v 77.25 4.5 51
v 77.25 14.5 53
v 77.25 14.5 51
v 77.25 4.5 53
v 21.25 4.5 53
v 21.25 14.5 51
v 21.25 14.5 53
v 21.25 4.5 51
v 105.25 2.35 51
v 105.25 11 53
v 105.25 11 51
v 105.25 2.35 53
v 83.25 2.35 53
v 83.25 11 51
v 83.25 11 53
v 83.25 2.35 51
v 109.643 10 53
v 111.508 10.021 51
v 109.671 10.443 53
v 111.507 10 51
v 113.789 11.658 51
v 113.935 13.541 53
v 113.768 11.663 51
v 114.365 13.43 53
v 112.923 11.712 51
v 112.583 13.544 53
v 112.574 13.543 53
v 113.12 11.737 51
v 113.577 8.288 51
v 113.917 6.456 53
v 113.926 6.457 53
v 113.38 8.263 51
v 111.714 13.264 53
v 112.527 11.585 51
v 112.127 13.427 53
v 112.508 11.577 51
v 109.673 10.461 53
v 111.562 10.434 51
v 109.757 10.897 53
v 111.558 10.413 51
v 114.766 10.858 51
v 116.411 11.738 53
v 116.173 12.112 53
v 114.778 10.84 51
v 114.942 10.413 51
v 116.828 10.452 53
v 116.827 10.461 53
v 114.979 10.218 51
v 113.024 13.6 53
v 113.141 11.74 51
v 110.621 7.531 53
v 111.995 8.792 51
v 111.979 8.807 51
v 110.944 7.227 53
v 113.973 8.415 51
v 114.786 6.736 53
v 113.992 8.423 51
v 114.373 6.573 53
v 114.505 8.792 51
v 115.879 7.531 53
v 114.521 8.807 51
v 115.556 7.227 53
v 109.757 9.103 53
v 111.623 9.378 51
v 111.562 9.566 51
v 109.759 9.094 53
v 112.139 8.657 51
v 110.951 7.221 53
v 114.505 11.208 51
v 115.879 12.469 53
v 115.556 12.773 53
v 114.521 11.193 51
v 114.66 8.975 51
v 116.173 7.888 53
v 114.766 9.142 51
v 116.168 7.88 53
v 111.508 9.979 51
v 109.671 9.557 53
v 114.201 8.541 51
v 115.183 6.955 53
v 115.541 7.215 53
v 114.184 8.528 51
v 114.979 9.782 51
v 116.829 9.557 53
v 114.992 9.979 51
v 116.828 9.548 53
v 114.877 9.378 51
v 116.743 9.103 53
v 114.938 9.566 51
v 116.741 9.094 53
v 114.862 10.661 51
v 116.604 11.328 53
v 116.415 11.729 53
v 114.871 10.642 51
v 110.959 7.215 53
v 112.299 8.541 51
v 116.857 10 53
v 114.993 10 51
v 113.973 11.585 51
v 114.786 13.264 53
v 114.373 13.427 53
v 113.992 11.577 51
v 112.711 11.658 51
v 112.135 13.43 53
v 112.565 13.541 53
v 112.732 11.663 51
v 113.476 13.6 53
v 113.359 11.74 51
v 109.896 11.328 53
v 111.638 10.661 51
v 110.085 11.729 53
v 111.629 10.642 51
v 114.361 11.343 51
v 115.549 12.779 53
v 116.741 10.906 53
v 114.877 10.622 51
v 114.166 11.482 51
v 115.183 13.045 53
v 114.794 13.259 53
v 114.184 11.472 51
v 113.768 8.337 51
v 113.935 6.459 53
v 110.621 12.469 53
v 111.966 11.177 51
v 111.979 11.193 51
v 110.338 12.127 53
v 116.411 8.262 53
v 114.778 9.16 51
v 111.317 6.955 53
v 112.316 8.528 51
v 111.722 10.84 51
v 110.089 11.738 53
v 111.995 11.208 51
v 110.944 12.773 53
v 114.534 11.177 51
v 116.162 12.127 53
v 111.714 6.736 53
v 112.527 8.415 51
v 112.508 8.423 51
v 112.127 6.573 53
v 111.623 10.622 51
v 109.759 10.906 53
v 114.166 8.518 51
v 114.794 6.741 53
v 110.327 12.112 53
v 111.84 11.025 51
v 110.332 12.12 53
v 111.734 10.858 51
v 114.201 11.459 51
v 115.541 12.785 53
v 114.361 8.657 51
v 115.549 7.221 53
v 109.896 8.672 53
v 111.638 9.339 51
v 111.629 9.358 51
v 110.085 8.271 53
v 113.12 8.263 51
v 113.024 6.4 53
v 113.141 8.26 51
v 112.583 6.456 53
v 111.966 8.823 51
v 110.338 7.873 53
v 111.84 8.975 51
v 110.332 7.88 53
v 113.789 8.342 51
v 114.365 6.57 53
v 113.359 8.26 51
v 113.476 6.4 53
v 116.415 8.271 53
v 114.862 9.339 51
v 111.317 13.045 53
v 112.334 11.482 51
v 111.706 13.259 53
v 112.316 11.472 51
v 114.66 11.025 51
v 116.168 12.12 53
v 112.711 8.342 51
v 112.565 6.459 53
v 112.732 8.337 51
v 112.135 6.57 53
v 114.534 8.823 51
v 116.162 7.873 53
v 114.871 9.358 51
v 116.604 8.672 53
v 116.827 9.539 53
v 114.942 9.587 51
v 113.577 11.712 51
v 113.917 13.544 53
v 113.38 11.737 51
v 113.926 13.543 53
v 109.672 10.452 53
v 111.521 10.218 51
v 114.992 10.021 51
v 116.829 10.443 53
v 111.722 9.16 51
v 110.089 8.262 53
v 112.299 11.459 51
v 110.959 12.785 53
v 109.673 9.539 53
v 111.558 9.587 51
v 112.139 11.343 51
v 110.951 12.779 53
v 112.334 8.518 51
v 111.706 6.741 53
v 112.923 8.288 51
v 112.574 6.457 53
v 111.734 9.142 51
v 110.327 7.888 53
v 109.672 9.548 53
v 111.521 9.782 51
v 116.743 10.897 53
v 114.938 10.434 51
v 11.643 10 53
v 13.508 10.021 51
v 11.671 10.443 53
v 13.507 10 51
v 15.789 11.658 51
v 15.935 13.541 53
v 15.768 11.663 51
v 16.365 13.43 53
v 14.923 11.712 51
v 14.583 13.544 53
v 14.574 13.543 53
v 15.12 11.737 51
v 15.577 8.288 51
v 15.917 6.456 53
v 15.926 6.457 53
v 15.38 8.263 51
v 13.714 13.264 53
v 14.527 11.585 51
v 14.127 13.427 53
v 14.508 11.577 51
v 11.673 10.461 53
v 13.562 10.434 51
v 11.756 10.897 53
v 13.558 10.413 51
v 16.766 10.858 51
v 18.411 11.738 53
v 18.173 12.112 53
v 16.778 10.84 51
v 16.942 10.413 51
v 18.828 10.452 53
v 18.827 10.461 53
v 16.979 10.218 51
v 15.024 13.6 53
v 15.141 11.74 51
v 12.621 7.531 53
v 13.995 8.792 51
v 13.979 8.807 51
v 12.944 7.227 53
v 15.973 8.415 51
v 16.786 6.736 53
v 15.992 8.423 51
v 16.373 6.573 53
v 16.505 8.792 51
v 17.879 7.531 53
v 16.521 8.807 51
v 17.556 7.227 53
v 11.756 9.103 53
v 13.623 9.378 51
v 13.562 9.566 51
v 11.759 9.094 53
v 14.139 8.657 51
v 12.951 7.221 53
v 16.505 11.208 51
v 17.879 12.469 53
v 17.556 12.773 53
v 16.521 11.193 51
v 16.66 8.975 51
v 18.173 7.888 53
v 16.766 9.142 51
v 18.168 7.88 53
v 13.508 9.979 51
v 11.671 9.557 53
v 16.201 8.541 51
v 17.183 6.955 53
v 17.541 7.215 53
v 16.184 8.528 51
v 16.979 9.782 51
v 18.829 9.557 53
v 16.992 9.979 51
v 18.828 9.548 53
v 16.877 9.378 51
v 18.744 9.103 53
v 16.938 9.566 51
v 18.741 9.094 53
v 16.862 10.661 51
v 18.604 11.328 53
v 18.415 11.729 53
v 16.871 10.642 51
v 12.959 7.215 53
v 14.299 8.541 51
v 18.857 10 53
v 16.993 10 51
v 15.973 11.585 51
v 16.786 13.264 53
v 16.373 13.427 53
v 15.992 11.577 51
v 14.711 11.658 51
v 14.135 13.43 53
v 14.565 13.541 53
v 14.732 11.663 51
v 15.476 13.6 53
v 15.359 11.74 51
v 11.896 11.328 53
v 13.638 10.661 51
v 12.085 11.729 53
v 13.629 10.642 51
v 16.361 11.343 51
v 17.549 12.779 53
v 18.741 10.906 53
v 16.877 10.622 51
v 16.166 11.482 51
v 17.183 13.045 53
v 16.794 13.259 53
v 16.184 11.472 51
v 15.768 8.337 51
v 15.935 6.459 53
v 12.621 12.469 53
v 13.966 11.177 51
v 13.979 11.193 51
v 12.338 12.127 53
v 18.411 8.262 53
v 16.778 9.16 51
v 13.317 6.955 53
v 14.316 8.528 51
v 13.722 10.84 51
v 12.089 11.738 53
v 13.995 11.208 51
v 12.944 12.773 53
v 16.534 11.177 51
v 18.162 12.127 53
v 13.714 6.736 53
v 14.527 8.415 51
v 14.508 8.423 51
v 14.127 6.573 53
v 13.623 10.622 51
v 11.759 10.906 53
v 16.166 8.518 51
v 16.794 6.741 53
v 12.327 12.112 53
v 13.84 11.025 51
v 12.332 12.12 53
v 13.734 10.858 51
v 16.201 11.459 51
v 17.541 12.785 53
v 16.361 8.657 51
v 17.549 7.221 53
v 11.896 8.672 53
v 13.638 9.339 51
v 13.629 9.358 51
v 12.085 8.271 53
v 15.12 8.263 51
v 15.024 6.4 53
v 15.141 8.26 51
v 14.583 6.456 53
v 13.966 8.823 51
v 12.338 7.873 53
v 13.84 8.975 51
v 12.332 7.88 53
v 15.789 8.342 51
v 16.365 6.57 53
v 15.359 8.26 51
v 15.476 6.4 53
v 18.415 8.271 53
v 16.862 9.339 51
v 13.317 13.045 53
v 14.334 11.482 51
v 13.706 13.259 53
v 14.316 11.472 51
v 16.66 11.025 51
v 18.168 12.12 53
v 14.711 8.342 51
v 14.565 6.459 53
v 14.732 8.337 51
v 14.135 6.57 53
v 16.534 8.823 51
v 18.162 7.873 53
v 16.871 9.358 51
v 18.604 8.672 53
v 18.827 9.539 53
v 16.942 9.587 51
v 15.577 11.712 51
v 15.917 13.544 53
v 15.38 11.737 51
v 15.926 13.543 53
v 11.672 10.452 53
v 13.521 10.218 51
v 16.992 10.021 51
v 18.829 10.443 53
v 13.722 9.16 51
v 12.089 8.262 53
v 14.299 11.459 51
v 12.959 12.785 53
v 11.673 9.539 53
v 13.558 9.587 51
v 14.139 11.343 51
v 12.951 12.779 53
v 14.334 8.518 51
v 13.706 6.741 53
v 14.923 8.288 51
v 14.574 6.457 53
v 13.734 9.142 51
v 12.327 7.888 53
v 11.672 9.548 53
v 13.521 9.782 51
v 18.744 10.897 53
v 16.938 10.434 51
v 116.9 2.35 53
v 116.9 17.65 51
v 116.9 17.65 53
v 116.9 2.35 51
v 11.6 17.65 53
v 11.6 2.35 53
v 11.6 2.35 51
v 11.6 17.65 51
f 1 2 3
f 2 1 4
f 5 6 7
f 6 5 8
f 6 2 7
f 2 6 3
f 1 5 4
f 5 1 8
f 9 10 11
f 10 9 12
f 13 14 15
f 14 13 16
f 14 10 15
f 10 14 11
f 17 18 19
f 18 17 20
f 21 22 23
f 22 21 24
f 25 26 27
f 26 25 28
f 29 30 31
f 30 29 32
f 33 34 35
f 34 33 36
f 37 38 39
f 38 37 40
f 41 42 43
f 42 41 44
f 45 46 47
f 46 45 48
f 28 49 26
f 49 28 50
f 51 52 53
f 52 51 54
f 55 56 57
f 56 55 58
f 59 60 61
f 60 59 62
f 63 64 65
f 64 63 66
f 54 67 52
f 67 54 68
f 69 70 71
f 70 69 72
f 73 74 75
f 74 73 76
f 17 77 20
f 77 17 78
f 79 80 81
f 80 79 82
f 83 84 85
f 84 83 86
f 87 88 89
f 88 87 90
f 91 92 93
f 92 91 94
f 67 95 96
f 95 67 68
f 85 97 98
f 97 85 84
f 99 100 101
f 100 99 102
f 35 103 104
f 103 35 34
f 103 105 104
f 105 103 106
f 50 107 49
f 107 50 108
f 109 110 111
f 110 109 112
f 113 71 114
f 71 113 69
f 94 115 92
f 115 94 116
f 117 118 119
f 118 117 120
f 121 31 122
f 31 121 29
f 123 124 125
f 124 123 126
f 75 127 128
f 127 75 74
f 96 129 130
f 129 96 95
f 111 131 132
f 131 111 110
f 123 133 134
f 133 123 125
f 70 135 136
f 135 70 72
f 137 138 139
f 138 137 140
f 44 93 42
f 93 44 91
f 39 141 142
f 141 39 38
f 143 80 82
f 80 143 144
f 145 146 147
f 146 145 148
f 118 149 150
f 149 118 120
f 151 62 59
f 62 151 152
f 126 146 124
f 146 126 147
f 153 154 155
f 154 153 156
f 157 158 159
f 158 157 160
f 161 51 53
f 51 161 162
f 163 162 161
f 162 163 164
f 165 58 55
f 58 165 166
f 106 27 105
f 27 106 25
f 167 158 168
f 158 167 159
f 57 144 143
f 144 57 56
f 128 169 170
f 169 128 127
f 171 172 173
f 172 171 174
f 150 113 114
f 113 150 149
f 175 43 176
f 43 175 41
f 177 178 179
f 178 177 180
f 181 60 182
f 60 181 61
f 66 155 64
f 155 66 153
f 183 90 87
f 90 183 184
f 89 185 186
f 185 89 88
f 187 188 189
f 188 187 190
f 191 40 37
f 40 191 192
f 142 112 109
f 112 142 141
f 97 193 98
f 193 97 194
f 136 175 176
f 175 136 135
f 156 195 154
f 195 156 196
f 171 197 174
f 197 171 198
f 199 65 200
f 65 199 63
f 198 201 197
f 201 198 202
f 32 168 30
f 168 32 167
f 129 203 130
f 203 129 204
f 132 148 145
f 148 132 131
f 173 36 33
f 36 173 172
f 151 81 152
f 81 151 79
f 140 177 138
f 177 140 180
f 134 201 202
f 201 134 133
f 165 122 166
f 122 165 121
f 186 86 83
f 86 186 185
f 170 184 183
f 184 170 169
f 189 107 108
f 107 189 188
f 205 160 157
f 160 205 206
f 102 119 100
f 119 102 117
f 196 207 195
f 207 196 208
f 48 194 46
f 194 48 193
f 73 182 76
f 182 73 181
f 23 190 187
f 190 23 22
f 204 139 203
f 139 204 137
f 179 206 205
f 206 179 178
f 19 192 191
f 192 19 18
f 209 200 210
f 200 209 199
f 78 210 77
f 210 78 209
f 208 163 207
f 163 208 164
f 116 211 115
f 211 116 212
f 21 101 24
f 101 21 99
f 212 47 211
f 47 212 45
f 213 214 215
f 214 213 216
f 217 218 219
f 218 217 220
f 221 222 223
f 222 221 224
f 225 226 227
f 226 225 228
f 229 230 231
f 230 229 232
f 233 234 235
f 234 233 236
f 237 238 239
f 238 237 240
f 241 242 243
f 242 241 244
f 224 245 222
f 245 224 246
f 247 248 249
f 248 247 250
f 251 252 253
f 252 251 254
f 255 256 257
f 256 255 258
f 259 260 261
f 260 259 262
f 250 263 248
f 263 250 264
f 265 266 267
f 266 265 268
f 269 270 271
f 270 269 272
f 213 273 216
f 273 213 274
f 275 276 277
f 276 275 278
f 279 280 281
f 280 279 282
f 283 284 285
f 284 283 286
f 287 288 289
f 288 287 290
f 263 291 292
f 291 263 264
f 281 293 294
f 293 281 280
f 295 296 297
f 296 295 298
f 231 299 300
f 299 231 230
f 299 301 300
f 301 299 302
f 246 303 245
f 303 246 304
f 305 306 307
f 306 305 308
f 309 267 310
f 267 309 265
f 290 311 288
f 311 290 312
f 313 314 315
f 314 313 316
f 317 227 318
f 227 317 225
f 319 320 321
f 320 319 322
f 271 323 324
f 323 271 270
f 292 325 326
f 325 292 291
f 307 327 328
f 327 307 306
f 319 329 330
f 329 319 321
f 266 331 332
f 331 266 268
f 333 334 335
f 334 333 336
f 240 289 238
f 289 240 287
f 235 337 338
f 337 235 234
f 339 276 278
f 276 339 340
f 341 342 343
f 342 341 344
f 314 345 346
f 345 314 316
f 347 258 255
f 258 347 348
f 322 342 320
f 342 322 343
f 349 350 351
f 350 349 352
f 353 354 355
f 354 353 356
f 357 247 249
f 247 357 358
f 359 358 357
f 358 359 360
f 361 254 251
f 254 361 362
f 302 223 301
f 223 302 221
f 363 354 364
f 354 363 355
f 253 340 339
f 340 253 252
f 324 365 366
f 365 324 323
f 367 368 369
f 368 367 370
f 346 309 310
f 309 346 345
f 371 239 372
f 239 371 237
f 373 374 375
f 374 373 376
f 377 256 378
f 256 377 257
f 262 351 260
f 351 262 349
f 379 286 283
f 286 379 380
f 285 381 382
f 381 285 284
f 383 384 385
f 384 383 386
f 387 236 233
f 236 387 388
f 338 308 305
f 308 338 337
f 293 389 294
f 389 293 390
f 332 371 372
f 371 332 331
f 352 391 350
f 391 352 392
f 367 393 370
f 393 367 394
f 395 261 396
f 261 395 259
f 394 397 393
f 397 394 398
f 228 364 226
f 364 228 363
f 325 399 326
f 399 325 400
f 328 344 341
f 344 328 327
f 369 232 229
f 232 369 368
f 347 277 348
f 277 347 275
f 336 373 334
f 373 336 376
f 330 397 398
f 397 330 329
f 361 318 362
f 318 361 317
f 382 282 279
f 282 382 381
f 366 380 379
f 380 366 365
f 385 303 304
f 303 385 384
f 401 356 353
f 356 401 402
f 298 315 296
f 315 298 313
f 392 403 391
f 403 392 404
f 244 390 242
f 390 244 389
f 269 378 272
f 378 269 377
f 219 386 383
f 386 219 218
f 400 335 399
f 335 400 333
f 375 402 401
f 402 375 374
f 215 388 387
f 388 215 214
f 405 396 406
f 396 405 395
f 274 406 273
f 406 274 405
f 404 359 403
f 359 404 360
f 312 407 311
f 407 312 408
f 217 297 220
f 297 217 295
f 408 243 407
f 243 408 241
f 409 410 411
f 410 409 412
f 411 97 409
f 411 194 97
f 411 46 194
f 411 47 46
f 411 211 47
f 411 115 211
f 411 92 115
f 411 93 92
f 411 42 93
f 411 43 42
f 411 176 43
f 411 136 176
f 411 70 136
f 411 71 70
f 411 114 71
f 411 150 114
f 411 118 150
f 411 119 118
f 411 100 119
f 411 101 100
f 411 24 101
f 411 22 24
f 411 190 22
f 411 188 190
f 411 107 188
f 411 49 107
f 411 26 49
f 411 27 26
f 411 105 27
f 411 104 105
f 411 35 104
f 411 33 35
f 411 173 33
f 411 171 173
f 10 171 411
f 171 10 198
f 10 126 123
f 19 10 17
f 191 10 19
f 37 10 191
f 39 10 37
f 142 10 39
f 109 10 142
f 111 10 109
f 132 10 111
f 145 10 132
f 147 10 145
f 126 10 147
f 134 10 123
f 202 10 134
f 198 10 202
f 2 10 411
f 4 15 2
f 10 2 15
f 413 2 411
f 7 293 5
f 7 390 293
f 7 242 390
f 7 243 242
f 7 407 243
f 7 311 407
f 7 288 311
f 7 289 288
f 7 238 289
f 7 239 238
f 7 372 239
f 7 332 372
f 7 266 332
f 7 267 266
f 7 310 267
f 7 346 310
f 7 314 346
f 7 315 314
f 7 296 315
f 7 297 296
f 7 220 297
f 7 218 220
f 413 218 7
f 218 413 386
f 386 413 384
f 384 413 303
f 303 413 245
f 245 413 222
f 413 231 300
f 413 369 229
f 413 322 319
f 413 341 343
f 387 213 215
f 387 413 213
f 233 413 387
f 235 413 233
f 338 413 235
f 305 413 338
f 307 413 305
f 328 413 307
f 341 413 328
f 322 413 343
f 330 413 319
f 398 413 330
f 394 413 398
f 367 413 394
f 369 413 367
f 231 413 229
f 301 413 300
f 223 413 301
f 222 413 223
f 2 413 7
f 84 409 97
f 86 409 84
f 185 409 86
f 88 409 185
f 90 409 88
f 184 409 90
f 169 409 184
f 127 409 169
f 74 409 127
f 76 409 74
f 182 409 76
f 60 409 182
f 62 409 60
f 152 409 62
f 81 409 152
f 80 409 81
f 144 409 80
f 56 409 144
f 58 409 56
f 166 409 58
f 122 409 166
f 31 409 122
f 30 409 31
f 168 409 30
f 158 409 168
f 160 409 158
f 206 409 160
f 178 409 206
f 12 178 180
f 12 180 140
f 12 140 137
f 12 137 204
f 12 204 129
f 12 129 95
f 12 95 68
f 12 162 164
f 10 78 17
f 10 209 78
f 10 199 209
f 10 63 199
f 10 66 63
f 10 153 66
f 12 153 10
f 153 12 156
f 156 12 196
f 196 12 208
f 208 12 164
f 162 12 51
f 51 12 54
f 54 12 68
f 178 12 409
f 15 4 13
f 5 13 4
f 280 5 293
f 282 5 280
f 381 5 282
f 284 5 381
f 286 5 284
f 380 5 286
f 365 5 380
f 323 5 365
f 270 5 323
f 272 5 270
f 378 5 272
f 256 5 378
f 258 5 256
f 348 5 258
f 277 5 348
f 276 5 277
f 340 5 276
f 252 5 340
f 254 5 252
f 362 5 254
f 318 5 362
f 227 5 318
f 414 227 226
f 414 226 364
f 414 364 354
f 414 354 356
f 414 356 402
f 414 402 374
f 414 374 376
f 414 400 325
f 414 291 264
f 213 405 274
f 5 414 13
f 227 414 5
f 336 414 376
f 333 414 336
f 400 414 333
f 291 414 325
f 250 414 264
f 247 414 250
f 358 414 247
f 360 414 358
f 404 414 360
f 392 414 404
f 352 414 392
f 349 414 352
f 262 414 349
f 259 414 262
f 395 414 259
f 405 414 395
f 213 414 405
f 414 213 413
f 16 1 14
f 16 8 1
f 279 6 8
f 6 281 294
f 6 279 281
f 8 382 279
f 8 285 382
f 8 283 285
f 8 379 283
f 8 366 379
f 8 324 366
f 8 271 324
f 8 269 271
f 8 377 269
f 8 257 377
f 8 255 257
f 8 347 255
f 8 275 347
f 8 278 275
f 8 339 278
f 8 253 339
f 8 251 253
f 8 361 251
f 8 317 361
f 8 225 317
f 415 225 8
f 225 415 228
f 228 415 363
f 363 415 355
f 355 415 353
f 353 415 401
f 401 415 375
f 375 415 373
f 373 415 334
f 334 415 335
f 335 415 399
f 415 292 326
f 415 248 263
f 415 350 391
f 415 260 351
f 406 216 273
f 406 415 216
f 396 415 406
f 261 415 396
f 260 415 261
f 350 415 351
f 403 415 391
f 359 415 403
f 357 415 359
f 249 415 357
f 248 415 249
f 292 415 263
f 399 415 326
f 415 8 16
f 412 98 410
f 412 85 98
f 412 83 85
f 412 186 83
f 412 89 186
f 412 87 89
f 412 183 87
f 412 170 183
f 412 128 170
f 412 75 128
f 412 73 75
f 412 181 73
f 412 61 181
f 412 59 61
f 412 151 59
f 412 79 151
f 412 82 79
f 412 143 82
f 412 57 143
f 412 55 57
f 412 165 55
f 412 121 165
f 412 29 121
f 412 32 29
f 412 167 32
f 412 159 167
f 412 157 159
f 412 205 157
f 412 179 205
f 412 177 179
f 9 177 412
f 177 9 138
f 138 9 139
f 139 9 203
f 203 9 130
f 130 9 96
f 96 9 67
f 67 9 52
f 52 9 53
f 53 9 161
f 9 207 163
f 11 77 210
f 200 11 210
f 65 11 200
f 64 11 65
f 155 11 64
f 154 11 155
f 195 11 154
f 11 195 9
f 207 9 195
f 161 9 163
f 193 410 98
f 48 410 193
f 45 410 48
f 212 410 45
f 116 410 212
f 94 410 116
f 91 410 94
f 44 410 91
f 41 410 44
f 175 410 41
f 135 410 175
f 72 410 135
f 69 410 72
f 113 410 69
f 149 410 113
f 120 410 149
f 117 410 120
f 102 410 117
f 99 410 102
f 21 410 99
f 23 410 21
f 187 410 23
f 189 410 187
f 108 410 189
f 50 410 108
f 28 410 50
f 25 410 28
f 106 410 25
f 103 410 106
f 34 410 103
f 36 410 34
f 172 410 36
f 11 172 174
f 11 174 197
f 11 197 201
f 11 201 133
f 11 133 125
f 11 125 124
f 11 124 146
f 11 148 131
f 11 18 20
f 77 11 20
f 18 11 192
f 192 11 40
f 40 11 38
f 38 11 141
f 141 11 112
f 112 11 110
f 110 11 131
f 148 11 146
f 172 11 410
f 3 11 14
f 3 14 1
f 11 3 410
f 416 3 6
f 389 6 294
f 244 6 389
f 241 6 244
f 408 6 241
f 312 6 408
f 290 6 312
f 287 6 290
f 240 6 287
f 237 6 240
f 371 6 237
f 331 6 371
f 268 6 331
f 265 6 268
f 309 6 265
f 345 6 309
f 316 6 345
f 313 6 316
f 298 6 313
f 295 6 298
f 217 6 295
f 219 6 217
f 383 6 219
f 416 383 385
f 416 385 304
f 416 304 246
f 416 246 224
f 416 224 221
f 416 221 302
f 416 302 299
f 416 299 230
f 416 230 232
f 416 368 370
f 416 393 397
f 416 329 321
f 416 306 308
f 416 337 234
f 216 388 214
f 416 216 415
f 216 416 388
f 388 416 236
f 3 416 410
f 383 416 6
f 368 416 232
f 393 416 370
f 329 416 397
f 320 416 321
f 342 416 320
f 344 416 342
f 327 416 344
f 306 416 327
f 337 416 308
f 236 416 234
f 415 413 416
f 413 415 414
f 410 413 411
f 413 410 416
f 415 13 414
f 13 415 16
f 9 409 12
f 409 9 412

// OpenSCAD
/* Power Supply Control Eurorack Enclosure Generator 
 * Modified for purpose by @realtimekodi
 * https://github.com/Real-Time-Kodi/EuroServerRack/
 * Initially designed by KronBjorn
 * https://github.com/KronBjorn/SixInchRack
 * 
 * Creative Commons 4.0 Share Alike With Attribution -- Non-Comercial
 * http://creativecommons.org/licenses/by-nc-sa/4.0/
*/
include<../sixinch_library.scad>

print_frontplate_sml = false;
print_cabinet_sml    = false;
print_lid            = false;
print_rear           = true;


Vent_Length          = 22;
Vent_Frequency       = 6;
Vent_Thickness       = 3;
standoff_hole_size   = 2.3;//2.3 for m2.5, 2.8 for m3
Depth                = 50; //Depth of the case min is somewhere around 98
hp                   = 4; //How many hp units you want this to be min is prob 5

if(print_frontplate_sml){ // Frontplate //
    w=boffset-gauge_box;
    square_hole        = [];
    round_hole         = [[w+20,hp*2.5,5],[w+35,hp*2.5,5],[w+50,hp*2.5,5],[w+65,hp*2.5,5],
        [w+85,hp*2.5,6.5]];
    round_peg          = [];   
    screw_side_front   = [hp/2];
    screw_top          = [];
    screw_bottom_front = [];
    
    frontplate(hp,square_hole,round_hole,round_peg,screw_side_front,screw_top,screw_bottom_front);
}

if(print_cabinet_sml){ // Cabinet //  
    w=pi_offset_x;
    h=pi_offset_y;
    screw_bottom_front = [];
    screw_side_front   = [hp/2];
    round_peg          = [[84,Depth-19,6,standoff_hole_size,6]];
    cabinet(Depth,hp,screw_bottom_front,round_peg,screw_side_front);
}

if(print_lid){ // Lid // 
    screw_front = [];//mm
    screw_back  = [];//mm
    lid(Depth,hp,screw_front,screw_back);        
}

if(print_rear){  // Back plate //    
    square_hole  = [
        [10,2.5,56,10],//24
        [72,0,22,9],//molex
    ];
    round_hole   = [];
    screw_top    = [];//mm
    screw_bottom = [];//mm
    screw_side   = [hp/2];
    back_plate(hp,Depth,screw_top,screw_bottom,screw_side,square_hole,round_hole);
}  
